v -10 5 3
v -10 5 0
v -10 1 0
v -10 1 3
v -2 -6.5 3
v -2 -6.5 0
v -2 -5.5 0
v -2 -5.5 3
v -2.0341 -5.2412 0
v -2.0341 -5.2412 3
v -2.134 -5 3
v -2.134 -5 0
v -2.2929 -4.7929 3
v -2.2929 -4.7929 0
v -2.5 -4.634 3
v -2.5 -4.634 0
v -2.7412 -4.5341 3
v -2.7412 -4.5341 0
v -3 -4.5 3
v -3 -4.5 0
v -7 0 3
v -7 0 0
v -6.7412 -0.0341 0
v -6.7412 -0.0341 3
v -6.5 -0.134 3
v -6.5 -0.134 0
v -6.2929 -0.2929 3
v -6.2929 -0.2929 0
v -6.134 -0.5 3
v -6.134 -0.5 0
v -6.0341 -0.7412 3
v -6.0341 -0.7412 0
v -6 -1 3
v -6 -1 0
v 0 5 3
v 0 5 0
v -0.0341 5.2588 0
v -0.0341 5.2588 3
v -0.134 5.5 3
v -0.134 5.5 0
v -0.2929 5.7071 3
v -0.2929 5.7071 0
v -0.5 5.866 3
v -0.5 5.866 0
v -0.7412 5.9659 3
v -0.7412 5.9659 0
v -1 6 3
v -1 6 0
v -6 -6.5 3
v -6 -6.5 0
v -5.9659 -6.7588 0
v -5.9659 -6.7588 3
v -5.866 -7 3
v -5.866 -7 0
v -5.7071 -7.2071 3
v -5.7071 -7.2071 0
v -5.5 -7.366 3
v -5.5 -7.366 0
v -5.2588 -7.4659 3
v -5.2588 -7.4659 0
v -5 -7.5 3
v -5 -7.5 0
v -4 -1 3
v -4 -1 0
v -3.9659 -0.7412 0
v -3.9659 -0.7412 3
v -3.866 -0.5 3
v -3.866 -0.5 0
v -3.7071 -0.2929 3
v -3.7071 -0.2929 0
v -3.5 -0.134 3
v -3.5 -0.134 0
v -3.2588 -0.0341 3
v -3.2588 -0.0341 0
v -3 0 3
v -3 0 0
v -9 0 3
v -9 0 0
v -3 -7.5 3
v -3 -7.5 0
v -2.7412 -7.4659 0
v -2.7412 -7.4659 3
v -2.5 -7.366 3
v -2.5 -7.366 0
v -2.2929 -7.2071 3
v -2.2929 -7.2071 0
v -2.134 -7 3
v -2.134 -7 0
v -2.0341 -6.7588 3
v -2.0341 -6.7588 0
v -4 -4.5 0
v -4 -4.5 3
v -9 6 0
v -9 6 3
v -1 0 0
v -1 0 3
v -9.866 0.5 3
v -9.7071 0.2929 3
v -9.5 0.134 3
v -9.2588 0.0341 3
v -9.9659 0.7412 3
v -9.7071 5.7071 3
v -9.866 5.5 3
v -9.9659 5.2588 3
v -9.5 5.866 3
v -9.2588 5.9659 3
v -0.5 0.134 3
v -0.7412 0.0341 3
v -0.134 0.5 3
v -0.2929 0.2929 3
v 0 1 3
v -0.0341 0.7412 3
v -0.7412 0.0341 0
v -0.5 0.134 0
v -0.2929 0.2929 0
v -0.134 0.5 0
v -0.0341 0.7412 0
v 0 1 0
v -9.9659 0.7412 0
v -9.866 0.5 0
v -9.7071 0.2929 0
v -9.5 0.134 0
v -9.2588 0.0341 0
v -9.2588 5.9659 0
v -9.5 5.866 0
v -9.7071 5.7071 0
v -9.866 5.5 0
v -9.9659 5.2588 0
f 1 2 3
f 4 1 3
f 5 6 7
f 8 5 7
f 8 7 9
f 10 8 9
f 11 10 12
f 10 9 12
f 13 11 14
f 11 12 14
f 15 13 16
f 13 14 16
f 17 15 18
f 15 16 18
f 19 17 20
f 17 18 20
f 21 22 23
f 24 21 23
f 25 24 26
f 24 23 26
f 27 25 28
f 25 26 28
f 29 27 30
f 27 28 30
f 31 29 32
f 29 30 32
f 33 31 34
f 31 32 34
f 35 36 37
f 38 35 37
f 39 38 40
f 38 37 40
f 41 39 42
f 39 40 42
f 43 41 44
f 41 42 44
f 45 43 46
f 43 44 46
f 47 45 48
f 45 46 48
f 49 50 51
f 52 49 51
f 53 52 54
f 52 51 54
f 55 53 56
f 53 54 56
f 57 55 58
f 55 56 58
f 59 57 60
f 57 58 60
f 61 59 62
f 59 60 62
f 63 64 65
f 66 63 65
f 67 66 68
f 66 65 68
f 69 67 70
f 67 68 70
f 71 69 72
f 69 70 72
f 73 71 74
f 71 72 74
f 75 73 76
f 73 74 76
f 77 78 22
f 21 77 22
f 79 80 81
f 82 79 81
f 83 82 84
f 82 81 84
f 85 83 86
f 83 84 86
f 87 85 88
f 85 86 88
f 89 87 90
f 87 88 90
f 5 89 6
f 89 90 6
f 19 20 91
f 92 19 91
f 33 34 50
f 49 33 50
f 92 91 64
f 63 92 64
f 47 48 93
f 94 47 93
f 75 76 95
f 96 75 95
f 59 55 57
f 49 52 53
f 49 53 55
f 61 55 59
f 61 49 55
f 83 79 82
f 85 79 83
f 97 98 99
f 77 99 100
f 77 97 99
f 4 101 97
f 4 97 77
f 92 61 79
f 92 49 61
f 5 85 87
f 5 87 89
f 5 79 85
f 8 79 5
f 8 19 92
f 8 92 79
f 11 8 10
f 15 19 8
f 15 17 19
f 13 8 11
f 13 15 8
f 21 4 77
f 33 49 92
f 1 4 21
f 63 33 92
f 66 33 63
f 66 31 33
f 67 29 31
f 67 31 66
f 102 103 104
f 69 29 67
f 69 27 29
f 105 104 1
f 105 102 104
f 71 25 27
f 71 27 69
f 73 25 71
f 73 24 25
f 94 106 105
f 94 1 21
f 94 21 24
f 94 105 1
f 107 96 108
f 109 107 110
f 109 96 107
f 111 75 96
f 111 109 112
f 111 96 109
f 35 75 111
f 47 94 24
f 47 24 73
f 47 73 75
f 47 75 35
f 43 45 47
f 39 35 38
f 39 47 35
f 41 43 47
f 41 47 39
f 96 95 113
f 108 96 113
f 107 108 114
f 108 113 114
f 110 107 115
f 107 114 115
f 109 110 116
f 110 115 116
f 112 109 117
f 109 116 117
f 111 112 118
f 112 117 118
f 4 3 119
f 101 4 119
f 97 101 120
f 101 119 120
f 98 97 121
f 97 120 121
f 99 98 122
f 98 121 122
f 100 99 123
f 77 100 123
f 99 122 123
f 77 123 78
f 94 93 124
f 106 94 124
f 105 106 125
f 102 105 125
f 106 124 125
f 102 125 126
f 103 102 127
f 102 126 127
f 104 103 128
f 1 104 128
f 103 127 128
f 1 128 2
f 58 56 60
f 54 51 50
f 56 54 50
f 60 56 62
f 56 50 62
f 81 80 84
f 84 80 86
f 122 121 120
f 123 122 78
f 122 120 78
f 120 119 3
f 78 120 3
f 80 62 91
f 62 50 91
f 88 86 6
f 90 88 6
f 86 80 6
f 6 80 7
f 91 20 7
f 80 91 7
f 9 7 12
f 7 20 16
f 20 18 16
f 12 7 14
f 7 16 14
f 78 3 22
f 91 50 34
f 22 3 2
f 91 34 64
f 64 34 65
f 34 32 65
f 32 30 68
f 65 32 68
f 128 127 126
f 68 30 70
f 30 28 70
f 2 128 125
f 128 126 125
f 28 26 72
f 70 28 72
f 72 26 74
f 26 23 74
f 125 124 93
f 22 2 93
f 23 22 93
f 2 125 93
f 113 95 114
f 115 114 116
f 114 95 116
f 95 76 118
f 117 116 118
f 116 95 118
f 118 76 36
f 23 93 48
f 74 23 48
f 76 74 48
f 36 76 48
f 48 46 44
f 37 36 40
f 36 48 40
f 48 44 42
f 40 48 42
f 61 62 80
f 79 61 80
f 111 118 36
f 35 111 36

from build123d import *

# Parameters (mm, degrees)
F1_DEPTH = 3


with BuildPart() as f1:
    # F0 (on Top) → F1 (new body)
    with BuildSketch(Plane.XY):
        with BuildLine():
            Line((-3, 0), (-1, 0))
            ThreePointArc((-1, 0), (-0.292893, 0.292893), (0, 1))
            Line((0, 1), (0, 5))
            ThreePointArc((0, 5), (-0.292893, 5.707107), (-1, 6))
            Line((-1, 6), (-9, 6))
            ThreePointArc((-9, 6), (-9.707107, 5.707107), (-10, 5))
            Line((-10, 5), (-10, 1))
            ThreePointArc((-10, 1), (-9.707107, 0.292893), (-9, 0))
            Line((-9, 0), (-7, 0))
            ThreePointArc((-7, 0), (-6.292893, -0.292893), (-6, -1))
            Line((-6, -1), (-6, -6.5))
            ThreePointArc((-6, -6.5), (-5.707107, -7.207107), (-5, -7.5))
            Line((-5, -7.5), (-3, -7.5))
            ThreePointArc((-3, -7.5), (-2.292893, -7.207107), (-2, -6.5))
            Line((-2, -6.5), (-2, -5.5))
            ThreePointArc((-2, -5.5), (-2.292893, -4.792893), (-3, -4.5))
            Line((-3, -4.5), (-4, -4.5))
            Line((-4, -4.5), (-4, -1))
            ThreePointArc((-4, -1), (-3.707107, -0.292893), (-3, 0))
        make_face()
    extrude(amount=F1_DEPTH)


solid = f1.part
